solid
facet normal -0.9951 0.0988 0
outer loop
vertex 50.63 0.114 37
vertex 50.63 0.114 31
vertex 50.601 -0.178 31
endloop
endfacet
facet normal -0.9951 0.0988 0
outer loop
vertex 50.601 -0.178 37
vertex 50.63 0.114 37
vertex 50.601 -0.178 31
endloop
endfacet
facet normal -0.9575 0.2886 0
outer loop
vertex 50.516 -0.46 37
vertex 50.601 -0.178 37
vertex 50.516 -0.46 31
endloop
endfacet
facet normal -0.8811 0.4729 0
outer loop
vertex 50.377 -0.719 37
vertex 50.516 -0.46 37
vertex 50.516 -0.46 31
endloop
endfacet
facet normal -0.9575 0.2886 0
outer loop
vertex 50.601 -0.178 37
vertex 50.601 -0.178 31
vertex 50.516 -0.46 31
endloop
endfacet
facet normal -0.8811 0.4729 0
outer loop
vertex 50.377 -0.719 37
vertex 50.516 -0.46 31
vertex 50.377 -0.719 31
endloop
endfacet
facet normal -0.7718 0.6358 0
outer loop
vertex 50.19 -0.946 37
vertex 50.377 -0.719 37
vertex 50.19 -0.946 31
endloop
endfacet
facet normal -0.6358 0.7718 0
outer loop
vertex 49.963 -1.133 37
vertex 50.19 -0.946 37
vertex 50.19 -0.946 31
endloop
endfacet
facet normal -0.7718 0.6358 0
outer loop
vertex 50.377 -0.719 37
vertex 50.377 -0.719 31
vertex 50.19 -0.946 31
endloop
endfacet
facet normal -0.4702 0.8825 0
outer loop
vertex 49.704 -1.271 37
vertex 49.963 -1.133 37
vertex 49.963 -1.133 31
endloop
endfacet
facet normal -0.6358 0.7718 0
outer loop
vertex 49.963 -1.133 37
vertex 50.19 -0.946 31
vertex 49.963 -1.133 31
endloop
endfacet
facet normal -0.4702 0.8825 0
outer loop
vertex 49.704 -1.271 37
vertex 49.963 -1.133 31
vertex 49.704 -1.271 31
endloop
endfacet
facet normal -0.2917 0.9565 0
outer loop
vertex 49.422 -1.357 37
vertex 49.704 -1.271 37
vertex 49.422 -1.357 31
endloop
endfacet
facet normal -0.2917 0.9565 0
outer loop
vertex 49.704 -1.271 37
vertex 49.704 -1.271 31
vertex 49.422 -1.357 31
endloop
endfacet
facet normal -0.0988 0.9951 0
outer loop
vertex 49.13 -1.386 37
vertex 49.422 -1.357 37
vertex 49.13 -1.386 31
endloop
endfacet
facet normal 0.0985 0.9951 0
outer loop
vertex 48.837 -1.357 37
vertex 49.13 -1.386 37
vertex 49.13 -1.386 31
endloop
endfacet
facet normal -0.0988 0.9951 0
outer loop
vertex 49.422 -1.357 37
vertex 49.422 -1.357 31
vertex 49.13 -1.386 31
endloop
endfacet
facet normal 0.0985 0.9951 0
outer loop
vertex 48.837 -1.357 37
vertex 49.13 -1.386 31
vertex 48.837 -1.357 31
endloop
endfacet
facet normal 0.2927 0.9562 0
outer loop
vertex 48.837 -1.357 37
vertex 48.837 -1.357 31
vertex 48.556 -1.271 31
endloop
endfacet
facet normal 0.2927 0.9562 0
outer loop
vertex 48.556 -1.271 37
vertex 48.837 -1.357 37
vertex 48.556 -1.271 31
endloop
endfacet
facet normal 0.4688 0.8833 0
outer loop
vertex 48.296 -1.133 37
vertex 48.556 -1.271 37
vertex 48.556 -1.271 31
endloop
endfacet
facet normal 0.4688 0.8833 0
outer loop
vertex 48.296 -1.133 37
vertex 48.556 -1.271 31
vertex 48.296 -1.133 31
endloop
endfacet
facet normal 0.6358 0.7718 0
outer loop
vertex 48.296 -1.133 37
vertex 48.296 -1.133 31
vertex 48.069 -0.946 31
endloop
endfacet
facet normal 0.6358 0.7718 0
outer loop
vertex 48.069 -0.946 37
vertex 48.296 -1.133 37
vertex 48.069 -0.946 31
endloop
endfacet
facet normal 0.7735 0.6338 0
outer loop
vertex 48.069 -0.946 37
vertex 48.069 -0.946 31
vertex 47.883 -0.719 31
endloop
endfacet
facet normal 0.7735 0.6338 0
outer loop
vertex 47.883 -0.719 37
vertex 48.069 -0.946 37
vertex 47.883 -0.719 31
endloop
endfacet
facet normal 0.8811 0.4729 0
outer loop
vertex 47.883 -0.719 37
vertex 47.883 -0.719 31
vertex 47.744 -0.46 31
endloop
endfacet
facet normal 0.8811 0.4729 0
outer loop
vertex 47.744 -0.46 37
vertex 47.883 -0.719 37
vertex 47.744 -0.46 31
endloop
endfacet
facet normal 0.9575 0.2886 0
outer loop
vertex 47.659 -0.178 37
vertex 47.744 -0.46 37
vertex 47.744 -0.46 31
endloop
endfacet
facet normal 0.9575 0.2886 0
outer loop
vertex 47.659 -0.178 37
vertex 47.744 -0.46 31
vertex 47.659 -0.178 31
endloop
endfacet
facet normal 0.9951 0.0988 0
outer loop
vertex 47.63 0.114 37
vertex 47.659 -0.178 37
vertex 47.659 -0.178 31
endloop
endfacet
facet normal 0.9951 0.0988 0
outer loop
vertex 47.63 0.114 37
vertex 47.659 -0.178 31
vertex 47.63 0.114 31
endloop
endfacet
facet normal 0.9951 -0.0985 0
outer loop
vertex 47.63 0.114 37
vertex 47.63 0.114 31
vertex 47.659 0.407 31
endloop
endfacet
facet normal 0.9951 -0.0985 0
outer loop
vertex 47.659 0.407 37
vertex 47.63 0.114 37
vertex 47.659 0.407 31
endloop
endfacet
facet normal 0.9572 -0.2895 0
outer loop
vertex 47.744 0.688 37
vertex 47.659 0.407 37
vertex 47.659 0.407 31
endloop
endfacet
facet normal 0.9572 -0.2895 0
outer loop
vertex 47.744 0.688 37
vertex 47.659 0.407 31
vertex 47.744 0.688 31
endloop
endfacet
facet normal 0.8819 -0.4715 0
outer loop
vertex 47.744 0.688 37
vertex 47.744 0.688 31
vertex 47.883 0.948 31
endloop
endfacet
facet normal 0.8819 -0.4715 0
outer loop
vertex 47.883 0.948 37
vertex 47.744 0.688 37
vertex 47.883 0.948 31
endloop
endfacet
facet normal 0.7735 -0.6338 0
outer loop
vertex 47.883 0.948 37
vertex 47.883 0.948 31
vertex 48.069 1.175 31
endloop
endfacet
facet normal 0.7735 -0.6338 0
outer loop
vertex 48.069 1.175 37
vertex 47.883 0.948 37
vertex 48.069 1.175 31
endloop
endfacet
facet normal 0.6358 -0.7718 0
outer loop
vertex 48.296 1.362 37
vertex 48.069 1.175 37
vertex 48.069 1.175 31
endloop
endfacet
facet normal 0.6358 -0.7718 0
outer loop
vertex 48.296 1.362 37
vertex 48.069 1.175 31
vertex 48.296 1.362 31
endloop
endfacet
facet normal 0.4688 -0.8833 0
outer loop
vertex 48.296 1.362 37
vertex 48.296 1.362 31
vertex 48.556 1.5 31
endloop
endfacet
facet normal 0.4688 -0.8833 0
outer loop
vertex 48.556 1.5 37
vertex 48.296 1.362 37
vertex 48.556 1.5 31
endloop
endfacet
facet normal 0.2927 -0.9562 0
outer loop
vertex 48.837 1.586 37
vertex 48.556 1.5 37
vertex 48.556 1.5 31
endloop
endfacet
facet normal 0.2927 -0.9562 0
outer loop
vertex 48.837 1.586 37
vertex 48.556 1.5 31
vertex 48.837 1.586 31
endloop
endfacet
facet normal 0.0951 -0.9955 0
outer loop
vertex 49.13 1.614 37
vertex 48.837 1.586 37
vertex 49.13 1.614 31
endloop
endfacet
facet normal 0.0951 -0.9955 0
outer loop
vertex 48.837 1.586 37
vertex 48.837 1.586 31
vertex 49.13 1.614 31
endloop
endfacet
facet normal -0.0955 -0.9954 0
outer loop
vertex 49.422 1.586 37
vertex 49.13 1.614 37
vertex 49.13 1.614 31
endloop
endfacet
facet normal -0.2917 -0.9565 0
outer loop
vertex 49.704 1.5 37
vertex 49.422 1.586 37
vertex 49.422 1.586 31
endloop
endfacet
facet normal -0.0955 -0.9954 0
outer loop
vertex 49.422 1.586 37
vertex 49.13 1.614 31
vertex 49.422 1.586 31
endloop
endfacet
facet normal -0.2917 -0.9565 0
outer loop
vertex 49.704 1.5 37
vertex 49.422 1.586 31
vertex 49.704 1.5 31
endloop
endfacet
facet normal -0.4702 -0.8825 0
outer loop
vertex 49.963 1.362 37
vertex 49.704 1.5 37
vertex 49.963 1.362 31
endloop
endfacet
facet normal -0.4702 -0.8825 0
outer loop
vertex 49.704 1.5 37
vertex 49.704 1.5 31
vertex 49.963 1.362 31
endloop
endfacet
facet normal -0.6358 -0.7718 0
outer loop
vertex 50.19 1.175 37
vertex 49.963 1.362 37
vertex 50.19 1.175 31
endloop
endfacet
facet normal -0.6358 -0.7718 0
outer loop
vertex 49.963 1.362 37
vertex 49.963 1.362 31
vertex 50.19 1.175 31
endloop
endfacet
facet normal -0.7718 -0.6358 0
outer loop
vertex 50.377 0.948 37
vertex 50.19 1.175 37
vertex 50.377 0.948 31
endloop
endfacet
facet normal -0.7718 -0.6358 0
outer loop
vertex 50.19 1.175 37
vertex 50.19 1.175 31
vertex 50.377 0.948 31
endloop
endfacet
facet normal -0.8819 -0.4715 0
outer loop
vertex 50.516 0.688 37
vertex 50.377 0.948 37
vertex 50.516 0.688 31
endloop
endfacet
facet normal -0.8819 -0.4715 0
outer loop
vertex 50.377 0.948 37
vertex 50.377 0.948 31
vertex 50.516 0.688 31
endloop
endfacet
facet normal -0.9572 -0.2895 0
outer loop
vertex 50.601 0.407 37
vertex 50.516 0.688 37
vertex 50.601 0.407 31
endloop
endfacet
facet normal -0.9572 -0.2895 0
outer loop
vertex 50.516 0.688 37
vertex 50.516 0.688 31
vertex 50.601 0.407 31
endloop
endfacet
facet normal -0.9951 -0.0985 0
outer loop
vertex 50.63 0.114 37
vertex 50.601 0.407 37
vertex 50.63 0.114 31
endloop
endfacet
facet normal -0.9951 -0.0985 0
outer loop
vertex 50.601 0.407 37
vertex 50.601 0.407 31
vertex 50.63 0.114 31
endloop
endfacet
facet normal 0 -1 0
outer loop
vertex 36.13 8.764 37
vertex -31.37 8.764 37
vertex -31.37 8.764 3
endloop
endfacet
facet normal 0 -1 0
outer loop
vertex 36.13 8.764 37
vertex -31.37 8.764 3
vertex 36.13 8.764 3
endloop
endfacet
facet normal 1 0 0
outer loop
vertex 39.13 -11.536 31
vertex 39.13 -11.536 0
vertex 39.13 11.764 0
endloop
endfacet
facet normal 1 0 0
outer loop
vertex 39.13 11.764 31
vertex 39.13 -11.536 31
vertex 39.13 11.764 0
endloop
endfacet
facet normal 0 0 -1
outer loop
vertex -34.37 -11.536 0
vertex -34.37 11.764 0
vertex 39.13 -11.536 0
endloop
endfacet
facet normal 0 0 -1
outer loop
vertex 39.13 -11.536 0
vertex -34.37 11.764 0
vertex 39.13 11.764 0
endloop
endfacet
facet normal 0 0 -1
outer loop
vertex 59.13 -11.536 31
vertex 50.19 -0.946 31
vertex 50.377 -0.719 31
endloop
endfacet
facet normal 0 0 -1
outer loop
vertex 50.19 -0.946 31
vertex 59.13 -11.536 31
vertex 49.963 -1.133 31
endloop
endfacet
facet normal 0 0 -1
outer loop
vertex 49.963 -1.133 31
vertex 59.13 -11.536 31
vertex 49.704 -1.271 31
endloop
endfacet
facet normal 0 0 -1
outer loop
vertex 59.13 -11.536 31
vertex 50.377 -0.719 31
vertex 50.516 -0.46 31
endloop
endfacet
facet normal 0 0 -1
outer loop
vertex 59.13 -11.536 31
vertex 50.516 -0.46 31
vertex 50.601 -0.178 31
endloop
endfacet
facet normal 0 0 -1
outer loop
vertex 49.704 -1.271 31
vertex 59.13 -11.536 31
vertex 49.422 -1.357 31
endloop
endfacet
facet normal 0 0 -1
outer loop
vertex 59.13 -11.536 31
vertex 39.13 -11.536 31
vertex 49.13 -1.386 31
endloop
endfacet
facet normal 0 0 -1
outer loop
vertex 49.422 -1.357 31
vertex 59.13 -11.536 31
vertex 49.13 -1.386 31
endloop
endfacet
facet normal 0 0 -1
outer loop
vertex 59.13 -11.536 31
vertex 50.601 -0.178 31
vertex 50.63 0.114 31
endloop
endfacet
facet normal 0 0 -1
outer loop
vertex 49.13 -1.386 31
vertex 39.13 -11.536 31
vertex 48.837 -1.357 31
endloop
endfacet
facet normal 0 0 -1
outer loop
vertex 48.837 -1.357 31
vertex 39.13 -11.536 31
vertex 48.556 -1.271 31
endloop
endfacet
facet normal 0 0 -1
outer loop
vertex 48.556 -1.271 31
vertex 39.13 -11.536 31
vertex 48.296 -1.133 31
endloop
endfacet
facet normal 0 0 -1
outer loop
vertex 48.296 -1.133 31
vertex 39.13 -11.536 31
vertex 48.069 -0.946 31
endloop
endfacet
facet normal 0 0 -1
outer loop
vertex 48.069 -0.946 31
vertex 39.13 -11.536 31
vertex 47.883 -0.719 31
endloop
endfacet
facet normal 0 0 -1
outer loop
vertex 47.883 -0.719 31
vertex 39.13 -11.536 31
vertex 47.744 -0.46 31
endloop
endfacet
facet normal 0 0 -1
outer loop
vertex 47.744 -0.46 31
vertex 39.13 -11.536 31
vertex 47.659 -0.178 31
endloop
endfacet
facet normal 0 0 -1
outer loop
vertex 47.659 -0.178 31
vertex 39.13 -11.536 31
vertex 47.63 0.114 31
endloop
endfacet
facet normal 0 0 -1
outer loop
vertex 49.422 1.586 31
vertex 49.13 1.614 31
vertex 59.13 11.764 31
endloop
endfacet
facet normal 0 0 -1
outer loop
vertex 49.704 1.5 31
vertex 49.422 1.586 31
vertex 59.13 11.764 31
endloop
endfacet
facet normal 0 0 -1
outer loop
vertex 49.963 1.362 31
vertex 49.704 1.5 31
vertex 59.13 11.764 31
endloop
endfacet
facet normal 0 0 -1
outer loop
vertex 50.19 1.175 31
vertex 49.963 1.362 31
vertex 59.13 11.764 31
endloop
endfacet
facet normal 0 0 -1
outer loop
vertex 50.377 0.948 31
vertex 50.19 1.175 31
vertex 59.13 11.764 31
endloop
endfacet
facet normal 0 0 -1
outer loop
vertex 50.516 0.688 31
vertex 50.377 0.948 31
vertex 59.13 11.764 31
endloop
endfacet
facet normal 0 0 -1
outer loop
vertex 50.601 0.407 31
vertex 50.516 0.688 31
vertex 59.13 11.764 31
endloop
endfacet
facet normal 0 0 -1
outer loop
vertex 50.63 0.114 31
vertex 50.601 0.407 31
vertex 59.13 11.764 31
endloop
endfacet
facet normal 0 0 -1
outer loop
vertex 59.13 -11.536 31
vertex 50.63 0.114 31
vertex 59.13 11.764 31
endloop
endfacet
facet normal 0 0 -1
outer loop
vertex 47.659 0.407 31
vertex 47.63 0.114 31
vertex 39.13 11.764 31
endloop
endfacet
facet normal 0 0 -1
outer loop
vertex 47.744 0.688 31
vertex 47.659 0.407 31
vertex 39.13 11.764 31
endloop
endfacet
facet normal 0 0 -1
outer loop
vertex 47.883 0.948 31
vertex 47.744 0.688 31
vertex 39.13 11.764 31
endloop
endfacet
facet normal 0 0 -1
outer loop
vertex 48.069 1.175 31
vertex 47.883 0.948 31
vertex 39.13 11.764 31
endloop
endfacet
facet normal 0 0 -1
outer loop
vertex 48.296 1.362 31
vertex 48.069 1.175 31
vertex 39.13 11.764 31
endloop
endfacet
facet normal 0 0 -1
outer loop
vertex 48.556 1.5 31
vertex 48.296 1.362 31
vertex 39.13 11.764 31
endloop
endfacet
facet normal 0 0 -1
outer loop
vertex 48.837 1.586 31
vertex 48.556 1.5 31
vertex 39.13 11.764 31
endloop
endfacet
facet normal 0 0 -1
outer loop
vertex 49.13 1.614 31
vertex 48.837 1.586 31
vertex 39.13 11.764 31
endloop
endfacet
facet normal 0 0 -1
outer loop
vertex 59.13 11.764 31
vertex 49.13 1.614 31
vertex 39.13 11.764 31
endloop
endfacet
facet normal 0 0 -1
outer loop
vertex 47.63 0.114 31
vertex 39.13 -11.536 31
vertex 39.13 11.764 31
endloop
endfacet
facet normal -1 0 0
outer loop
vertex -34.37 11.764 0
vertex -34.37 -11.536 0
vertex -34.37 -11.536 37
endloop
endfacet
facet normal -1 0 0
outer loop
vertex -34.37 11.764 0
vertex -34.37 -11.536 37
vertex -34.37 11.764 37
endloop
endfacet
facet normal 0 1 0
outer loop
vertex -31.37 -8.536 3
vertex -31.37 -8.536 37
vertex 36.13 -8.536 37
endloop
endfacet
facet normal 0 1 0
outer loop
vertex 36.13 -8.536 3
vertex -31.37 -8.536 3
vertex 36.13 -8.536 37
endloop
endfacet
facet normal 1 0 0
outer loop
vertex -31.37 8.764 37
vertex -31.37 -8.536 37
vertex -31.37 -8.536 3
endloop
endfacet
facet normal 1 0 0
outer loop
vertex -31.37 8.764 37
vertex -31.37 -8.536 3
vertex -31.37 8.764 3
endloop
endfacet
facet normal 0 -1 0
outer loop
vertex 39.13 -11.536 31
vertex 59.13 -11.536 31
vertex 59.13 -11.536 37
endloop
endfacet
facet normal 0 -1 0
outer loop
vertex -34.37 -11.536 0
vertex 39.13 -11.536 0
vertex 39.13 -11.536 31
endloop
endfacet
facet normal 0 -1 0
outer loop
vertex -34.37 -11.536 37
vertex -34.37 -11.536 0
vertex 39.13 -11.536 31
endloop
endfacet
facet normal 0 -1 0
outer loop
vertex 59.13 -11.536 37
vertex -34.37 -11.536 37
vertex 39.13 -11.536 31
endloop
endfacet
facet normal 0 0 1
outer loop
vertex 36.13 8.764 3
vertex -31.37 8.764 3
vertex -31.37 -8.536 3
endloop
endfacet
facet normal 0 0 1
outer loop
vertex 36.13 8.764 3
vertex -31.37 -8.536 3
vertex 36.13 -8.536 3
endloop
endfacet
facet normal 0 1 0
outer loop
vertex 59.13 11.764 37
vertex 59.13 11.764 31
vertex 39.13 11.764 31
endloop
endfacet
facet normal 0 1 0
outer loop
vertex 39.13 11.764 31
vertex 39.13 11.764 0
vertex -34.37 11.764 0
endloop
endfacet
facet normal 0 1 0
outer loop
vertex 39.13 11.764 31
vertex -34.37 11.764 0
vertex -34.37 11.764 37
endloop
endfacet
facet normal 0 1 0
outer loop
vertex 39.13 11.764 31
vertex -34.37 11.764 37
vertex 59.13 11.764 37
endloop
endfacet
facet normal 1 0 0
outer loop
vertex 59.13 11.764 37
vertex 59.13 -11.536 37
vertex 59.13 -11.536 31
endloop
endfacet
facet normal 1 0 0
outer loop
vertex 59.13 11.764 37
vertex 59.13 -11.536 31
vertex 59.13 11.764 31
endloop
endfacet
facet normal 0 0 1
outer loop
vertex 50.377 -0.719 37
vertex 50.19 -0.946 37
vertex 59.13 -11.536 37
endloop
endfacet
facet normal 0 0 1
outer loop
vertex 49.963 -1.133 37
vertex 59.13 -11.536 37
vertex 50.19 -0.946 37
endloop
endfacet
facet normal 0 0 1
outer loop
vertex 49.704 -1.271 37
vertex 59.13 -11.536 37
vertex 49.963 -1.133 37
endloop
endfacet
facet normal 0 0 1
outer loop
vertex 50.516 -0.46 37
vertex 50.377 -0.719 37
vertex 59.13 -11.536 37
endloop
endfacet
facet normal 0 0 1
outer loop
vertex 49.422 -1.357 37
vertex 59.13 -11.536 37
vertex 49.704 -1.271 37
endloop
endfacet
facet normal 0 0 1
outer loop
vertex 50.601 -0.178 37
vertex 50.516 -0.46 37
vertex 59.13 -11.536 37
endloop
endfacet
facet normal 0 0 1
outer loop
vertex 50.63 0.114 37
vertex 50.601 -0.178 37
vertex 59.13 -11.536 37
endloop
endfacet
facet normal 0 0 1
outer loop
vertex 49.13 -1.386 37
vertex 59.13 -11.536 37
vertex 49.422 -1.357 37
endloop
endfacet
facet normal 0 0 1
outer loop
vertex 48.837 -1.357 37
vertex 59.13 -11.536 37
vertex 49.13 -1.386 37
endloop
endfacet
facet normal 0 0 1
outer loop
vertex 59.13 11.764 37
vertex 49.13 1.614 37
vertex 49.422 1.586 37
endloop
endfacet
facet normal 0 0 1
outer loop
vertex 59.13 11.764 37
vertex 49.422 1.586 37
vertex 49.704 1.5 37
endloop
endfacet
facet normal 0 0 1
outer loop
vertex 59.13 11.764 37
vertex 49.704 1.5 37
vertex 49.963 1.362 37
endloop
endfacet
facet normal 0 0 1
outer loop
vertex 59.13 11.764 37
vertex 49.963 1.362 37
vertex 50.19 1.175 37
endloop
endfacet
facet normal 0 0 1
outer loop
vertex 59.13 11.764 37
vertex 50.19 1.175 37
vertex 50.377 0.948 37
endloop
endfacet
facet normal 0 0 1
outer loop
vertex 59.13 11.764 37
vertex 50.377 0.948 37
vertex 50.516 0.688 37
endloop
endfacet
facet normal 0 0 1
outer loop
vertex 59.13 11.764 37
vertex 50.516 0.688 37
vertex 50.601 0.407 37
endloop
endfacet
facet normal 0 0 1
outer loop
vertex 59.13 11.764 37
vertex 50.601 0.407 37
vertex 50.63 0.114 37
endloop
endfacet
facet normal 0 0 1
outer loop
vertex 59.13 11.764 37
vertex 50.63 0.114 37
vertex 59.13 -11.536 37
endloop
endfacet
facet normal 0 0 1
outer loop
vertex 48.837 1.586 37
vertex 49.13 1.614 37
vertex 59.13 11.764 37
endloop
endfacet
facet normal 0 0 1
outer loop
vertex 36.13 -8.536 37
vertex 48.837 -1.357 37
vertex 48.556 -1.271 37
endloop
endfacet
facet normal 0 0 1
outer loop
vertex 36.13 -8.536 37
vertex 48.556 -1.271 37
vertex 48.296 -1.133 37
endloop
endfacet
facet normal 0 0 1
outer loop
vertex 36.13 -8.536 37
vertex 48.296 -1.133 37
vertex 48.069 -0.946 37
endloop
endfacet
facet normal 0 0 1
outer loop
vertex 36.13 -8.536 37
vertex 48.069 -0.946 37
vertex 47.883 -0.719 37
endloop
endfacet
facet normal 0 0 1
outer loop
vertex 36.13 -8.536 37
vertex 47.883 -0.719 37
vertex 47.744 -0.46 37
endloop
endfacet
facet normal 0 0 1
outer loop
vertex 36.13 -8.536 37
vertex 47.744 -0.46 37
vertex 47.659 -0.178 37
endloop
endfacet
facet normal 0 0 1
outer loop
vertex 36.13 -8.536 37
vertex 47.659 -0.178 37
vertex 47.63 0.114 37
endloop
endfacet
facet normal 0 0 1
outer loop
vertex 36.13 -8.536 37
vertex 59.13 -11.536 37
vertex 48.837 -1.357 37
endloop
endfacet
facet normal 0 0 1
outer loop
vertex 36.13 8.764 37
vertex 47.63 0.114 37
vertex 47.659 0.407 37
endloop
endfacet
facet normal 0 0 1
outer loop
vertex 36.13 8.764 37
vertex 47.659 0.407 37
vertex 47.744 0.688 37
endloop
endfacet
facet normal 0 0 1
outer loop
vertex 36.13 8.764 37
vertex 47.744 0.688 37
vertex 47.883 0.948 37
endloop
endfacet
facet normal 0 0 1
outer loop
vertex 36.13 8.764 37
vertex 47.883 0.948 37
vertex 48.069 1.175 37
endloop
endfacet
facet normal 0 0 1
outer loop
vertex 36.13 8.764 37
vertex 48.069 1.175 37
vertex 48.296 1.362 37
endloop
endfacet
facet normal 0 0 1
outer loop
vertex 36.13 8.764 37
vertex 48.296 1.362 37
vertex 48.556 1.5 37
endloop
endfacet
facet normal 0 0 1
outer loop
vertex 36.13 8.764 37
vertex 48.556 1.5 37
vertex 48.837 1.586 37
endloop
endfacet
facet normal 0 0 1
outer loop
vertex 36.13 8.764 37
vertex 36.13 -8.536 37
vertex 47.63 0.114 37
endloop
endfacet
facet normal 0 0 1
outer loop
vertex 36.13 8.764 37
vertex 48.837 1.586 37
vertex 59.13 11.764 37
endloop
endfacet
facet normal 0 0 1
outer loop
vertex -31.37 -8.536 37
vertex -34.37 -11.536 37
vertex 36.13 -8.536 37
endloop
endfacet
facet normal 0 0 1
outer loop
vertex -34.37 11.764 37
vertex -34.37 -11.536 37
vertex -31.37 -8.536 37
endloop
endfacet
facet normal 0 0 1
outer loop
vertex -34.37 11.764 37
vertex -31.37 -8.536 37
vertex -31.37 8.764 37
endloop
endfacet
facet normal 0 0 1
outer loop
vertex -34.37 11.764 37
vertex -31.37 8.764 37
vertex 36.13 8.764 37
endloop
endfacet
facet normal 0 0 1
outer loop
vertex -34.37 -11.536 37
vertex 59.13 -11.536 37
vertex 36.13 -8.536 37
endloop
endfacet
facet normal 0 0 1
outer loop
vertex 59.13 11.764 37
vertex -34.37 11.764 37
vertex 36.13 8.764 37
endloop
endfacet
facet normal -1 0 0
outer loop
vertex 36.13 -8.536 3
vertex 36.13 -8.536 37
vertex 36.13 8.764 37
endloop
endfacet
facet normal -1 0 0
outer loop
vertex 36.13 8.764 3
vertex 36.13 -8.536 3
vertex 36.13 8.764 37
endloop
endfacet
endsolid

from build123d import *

# Parameters (mm, degrees)
SKETCH_W        = 73.5
SKETCH_H        = 23.3
PAD_DEPTH       = 37
SKETCH001_W     = 67.5
SKETCH001_H     = 17.3
POCKET_DEPTH    = 34
SKETCH002_W     = 23.3
SKETCH002_H     = 6
PAD001_DEPTH    = 20
SKETCH003_R     = 1.5
POCKET001_DEPTH = 30


with BuildPart() as part:
    # Sketch → Pad (new body)
    with BuildSketch(Plane.XY):
        with Locations((2.379754, 0.114429)):
            Rectangle(SKETCH_W, SKETCH_H)
    extrude(amount=PAD_DEPTH)

    # Sketch001 (on Face6 of Pad) → Pocket (cut)
    with BuildSketch(Plane.XY.offset(37)):
        with Locations((2.379754, 0.114429)):
            Rectangle(SKETCH001_W, SKETCH001_H)
    extrude(amount=-POCKET_DEPTH, mode=Mode.SUBTRACT)

    # Sketch002 (on Face6 of Pocket) → Pad001 (join)
    with BuildSketch(Plane.YZ.offset(39.129754)):
        with Locations((0.114429, 34)):
            Rectangle(SKETCH002_W, SKETCH002_H)
    extrude(amount=PAD001_DEPTH)

    # Sketch003 (on Face4 of Pad001) → Pocket001 (cut)
    with BuildSketch(Plane(origin=(0, 0, 31), x_dir=(1, 0, 0), z_dir=(0, 0, -1))):
        with Locations((49.129754, -0.114429)):
            Circle(SKETCH003_R)
    extrude(amount=-POCKET001_DEPTH, mode=Mode.SUBTRACT)


solid = part.part
